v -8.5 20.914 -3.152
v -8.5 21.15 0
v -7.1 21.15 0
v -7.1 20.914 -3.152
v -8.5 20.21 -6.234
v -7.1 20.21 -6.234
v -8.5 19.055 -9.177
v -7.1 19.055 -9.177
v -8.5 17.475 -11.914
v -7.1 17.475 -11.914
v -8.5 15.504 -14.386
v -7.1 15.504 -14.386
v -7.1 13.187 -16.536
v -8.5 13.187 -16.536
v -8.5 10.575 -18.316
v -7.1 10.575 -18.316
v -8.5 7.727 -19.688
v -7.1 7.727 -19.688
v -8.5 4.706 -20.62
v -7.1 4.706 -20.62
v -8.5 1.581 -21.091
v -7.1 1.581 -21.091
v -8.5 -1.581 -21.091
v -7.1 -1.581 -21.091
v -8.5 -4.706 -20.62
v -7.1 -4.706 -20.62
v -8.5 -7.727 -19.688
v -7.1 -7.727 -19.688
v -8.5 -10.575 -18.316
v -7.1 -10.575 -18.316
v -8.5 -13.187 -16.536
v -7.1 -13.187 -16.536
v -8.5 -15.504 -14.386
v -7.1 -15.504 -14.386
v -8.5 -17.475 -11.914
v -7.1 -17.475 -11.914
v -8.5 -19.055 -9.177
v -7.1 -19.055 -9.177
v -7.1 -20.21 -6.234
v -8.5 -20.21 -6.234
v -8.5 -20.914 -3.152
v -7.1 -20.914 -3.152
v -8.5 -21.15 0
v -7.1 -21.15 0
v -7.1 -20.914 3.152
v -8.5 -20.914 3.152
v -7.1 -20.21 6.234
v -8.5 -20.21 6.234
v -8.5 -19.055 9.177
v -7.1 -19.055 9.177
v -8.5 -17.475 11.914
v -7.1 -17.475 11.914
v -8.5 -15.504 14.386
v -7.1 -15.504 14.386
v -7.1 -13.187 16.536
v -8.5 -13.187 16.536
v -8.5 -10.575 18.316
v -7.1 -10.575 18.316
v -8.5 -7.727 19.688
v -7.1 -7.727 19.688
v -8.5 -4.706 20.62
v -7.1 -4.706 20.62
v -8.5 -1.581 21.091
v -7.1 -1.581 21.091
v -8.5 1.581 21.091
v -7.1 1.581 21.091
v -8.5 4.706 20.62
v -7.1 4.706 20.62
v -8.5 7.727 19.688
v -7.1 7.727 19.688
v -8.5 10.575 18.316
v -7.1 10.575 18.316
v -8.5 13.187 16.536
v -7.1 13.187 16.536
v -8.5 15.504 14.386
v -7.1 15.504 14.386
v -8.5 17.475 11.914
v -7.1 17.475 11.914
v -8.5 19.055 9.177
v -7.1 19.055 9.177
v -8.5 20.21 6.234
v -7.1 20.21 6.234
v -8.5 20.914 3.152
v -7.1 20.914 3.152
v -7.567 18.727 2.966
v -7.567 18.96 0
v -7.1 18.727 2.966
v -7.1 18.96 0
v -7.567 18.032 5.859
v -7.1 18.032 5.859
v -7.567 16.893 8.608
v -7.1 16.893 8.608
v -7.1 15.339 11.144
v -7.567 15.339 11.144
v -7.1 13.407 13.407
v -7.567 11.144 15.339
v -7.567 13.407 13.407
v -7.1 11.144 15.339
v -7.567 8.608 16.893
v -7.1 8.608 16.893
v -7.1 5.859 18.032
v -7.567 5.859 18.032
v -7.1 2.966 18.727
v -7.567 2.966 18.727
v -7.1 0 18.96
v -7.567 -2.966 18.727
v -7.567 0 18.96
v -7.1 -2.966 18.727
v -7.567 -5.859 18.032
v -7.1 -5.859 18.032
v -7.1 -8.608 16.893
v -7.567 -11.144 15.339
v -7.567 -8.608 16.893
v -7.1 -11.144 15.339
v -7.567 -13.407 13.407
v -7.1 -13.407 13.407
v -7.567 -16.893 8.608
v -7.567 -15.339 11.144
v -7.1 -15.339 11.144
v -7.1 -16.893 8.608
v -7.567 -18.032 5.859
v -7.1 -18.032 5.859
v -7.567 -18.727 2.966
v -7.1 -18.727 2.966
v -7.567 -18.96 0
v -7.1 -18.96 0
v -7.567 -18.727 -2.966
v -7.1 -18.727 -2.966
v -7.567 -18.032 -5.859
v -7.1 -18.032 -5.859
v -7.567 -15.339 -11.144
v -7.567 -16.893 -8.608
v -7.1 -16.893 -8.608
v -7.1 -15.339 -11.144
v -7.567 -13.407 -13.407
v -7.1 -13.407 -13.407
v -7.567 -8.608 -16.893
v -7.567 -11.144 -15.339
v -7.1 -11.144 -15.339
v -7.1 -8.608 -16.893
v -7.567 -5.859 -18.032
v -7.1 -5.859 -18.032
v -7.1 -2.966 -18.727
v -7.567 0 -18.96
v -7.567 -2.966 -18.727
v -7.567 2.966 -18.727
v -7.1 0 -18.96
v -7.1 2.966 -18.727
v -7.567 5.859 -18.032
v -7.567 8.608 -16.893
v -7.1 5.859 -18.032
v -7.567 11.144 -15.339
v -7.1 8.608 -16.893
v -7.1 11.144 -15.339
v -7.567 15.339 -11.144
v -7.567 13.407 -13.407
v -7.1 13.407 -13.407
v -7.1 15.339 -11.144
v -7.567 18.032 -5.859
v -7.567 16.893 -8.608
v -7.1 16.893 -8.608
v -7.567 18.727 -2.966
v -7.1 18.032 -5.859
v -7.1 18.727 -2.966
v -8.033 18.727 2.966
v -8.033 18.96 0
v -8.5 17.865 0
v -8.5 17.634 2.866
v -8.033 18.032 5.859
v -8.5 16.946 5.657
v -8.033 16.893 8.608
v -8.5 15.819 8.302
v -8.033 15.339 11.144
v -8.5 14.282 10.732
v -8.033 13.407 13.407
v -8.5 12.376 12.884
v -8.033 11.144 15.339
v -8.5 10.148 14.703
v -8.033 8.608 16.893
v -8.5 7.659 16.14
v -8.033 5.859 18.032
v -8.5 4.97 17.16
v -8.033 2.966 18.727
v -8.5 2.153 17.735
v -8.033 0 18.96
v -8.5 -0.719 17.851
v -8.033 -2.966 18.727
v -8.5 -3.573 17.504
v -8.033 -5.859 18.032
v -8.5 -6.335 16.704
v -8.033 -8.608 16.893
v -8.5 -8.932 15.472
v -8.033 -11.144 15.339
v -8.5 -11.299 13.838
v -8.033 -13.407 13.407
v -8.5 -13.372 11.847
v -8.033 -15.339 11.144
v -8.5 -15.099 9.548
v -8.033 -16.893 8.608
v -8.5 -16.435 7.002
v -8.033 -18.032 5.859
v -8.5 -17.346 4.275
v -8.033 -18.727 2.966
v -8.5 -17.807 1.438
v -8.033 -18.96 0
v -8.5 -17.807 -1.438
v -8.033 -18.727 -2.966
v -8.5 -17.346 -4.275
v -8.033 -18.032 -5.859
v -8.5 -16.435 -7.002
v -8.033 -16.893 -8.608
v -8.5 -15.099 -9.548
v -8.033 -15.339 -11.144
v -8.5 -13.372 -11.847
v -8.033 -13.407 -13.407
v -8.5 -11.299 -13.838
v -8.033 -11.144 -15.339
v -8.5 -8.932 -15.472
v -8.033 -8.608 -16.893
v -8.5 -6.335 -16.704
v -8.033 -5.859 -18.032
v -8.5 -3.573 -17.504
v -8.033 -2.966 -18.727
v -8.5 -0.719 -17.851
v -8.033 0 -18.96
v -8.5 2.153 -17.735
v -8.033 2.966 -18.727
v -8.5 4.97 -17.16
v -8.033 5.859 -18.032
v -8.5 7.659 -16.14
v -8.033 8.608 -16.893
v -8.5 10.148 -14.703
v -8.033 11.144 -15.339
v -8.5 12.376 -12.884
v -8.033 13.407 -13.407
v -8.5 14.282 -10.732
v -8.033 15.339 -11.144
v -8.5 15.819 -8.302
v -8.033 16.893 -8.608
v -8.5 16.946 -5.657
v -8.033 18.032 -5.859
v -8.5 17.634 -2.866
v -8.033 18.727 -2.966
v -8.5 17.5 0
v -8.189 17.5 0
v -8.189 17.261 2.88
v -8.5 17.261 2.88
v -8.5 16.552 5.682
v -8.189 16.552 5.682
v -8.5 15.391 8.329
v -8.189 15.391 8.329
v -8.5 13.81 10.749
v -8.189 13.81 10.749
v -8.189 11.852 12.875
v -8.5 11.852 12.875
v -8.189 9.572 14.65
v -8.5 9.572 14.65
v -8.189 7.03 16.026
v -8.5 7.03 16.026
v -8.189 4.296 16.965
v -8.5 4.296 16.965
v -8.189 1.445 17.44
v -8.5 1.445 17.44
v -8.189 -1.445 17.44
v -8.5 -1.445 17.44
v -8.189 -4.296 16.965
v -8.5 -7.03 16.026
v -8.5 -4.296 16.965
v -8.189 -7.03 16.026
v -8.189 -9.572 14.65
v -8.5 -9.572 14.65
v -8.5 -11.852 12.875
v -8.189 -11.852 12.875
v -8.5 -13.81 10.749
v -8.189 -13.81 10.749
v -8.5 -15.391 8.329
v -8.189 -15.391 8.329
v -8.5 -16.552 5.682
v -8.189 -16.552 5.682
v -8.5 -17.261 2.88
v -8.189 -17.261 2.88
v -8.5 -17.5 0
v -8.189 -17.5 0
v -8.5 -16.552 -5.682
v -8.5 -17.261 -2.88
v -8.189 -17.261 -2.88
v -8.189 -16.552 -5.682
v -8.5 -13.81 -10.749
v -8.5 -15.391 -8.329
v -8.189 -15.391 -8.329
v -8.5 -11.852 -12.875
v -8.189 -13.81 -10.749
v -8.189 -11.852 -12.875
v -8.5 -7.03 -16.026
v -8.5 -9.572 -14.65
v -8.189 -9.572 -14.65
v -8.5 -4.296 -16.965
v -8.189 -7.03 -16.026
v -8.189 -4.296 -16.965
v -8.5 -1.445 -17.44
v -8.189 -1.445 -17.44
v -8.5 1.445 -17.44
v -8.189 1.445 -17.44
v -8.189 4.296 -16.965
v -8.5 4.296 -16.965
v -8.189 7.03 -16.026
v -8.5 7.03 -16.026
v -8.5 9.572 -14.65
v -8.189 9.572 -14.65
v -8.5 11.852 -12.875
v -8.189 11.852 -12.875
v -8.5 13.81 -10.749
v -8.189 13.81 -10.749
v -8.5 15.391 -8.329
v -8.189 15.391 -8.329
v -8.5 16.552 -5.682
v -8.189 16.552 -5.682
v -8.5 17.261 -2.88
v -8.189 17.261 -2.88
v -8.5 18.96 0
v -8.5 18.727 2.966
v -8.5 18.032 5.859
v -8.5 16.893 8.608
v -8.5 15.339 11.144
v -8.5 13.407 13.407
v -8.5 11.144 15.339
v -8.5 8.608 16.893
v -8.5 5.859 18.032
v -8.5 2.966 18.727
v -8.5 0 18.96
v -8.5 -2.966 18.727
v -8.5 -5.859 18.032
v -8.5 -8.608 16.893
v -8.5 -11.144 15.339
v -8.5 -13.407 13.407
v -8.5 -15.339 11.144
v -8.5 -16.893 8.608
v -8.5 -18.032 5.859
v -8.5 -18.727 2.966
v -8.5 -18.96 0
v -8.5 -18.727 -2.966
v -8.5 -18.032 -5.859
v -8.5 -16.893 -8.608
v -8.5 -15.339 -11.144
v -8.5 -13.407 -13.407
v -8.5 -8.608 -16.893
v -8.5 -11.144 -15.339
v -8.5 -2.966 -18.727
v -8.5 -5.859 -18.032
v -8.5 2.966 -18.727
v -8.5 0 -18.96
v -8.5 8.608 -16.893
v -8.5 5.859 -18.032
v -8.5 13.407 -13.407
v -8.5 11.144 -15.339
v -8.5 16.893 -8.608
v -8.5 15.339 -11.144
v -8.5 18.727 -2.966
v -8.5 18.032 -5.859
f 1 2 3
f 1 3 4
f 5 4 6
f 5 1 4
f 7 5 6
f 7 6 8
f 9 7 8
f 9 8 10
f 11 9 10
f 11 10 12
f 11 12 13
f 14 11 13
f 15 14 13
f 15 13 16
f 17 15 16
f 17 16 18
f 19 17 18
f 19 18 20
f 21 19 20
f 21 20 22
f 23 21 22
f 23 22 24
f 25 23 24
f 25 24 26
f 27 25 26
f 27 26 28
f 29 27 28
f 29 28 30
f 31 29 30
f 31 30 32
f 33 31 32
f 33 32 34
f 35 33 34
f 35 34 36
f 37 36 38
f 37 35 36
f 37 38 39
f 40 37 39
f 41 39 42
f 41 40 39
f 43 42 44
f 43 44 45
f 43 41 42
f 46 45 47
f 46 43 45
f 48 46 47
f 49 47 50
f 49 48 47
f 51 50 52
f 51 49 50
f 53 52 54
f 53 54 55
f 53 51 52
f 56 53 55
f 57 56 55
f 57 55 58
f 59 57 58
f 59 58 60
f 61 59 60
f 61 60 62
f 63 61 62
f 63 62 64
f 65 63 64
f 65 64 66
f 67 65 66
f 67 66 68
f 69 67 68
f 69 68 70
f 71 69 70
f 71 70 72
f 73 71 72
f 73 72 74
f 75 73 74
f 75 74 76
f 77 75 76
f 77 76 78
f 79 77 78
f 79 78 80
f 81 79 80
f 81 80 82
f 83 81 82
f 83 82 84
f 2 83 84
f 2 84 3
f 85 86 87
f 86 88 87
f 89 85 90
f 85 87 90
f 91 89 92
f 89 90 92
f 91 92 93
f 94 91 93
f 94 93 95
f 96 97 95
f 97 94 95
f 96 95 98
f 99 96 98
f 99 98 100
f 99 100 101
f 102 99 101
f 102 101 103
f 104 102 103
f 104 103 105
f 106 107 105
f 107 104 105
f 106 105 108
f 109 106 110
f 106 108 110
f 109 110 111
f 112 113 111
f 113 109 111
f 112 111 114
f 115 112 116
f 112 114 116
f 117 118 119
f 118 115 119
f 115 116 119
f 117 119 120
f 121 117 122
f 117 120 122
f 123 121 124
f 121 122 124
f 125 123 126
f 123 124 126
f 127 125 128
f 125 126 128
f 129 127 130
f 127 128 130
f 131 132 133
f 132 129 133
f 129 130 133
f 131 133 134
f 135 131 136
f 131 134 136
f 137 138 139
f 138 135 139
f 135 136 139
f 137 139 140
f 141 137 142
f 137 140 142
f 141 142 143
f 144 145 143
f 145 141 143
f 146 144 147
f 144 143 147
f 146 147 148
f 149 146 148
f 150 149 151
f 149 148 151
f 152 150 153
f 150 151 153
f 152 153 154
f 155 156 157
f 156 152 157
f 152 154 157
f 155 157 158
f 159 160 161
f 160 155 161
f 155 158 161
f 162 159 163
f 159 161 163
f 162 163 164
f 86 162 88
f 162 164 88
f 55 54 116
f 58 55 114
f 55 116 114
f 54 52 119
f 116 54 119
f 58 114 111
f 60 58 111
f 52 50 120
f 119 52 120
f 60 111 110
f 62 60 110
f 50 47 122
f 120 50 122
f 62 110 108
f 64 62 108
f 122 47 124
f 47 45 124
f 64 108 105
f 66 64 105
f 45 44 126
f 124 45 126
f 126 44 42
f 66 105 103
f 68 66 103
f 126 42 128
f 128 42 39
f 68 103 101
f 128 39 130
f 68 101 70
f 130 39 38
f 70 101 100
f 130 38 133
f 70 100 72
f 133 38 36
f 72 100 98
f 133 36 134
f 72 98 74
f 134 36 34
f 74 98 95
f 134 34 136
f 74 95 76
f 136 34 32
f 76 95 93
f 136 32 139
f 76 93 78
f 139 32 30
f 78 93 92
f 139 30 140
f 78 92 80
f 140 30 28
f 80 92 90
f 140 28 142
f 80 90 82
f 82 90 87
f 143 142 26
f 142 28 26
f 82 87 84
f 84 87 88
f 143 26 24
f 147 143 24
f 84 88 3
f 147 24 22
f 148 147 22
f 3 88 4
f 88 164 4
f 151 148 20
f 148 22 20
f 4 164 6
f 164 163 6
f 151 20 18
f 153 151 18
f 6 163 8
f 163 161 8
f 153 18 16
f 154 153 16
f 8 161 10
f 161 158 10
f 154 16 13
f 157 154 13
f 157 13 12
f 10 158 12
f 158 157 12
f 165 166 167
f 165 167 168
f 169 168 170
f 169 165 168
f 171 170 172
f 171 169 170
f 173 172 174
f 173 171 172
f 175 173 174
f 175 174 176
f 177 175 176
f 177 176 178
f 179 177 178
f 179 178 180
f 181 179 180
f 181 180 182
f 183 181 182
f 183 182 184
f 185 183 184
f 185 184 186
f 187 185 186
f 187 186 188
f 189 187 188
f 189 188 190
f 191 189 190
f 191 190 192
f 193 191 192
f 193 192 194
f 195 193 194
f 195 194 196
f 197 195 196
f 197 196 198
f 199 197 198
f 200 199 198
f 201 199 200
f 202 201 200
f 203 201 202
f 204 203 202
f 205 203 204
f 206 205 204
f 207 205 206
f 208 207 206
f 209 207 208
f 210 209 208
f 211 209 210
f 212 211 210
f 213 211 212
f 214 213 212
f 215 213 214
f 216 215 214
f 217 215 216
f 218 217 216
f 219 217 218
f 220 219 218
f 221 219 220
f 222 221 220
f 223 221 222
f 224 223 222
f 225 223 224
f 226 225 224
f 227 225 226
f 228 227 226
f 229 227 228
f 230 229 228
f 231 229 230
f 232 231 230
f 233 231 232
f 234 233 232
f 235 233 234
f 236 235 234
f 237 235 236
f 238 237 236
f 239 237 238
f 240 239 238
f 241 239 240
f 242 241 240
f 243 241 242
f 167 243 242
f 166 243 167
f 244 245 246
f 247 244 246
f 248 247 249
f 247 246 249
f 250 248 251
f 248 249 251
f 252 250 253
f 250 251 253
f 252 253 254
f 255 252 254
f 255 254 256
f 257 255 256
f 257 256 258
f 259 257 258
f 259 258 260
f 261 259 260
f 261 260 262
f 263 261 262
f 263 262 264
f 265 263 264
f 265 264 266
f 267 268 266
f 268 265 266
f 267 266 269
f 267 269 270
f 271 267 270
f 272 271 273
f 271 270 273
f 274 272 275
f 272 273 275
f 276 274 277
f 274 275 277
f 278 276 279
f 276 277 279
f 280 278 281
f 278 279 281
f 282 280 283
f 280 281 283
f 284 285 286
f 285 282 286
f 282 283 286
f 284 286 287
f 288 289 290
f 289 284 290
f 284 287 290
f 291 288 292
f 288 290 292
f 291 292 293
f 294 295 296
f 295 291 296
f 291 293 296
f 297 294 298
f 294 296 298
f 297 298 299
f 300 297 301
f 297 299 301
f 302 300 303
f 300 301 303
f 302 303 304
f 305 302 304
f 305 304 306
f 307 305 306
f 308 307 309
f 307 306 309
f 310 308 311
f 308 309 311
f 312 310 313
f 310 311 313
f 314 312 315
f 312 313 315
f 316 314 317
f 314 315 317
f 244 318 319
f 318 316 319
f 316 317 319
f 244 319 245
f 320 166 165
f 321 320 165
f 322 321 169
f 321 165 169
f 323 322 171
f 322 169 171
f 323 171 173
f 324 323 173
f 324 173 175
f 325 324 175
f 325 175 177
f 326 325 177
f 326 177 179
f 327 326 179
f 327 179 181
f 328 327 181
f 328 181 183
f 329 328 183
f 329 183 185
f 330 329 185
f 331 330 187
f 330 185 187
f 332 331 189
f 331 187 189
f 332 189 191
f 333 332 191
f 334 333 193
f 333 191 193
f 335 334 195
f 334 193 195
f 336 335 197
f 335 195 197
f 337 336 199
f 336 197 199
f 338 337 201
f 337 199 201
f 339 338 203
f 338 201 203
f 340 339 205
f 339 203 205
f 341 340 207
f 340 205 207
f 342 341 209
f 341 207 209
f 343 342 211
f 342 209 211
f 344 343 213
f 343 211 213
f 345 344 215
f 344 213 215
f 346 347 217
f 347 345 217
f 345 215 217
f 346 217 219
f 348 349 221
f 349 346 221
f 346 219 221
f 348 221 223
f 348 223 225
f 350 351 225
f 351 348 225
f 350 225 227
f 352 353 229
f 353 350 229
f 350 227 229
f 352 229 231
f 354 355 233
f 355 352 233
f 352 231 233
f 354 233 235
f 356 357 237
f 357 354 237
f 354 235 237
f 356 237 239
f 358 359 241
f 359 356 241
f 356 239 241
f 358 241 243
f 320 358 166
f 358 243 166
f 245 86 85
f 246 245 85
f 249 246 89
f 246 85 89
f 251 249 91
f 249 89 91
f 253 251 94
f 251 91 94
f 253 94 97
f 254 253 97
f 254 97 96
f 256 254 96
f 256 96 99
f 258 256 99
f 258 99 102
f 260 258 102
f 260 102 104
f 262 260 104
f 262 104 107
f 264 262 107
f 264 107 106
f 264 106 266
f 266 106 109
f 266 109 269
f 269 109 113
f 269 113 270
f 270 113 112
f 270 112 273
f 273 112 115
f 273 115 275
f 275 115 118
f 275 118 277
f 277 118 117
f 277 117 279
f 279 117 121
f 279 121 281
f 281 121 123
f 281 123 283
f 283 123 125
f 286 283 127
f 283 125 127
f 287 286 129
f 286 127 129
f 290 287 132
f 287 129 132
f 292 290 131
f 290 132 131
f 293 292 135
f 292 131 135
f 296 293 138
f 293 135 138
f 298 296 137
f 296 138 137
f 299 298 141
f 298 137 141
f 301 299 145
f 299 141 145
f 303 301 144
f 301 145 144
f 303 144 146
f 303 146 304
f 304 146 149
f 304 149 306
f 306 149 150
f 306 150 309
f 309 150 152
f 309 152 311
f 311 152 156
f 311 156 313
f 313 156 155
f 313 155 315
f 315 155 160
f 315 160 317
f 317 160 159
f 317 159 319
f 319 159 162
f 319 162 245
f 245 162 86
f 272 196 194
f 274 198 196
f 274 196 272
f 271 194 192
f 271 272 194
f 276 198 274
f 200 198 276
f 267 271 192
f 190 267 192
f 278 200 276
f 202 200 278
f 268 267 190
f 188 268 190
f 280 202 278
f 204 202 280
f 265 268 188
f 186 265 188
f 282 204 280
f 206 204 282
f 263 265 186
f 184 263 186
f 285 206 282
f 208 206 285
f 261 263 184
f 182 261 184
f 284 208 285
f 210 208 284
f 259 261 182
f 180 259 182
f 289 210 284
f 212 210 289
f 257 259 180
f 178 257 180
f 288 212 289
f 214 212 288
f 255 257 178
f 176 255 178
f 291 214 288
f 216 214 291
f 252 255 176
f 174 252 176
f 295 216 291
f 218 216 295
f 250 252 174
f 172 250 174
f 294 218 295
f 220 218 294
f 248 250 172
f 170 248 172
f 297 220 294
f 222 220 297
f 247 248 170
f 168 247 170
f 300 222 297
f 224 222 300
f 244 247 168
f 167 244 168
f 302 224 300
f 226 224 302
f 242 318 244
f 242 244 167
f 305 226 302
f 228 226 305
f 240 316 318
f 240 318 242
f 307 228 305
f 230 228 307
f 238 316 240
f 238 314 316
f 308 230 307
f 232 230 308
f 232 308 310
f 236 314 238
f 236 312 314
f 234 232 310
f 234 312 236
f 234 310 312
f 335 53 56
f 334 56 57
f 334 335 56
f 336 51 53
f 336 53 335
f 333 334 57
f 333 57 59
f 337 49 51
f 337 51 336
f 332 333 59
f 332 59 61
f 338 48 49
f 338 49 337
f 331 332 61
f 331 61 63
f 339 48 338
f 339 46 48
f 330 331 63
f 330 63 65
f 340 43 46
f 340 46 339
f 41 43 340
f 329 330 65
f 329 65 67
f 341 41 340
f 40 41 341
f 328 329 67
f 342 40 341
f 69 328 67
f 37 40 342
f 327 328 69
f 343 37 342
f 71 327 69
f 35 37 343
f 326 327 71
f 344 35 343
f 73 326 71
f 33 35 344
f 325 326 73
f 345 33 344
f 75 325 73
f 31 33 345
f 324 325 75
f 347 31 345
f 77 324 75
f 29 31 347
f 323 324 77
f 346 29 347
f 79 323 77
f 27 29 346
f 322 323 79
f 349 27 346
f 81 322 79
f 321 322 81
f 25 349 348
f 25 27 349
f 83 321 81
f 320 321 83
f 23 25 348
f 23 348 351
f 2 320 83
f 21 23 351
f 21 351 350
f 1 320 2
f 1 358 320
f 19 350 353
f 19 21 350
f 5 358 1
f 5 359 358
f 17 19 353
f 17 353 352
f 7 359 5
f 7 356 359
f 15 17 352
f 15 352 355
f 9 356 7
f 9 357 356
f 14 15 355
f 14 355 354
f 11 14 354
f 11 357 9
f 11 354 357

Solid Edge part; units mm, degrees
sketch "Sketch1" plane through (0, 0, 0) normal (0, 0, 1) x (1, 0, 0)
  line L0 (-8.5, 17.865) -> (-8.5, 17.5)
  line L1 (-8.5, 17.5) -> (-8.1889, 17.5)
  line L2 (-8.1889, 17.5) -> (-7.5667, 18.96)
  line L3 (-7.5667, 18.96) -> (-7.1, 18.96)
  line L4 (-7.1, 18.96) -> (-7.1, 21.15)
  line L5 (-7.1, 21.15) -> (-8.5, 21.15)
  line L6 (-8.5, 21.15) -> (-8.5, 18.96)
  line L7 (-8.5, 18.96) -> (-8.0333, 18.96)
  line L8 (-8.0333, 18.96) -> (-8.5, 17.865)
revolve "RevolvedProtrusion1" add sketch "Sketch1" angle 360 about axis through (17, 0, 0) along (-1, 0, 0)
properties part number "NA 4906UU Seal" material "Aluminio, 7075-T6"
